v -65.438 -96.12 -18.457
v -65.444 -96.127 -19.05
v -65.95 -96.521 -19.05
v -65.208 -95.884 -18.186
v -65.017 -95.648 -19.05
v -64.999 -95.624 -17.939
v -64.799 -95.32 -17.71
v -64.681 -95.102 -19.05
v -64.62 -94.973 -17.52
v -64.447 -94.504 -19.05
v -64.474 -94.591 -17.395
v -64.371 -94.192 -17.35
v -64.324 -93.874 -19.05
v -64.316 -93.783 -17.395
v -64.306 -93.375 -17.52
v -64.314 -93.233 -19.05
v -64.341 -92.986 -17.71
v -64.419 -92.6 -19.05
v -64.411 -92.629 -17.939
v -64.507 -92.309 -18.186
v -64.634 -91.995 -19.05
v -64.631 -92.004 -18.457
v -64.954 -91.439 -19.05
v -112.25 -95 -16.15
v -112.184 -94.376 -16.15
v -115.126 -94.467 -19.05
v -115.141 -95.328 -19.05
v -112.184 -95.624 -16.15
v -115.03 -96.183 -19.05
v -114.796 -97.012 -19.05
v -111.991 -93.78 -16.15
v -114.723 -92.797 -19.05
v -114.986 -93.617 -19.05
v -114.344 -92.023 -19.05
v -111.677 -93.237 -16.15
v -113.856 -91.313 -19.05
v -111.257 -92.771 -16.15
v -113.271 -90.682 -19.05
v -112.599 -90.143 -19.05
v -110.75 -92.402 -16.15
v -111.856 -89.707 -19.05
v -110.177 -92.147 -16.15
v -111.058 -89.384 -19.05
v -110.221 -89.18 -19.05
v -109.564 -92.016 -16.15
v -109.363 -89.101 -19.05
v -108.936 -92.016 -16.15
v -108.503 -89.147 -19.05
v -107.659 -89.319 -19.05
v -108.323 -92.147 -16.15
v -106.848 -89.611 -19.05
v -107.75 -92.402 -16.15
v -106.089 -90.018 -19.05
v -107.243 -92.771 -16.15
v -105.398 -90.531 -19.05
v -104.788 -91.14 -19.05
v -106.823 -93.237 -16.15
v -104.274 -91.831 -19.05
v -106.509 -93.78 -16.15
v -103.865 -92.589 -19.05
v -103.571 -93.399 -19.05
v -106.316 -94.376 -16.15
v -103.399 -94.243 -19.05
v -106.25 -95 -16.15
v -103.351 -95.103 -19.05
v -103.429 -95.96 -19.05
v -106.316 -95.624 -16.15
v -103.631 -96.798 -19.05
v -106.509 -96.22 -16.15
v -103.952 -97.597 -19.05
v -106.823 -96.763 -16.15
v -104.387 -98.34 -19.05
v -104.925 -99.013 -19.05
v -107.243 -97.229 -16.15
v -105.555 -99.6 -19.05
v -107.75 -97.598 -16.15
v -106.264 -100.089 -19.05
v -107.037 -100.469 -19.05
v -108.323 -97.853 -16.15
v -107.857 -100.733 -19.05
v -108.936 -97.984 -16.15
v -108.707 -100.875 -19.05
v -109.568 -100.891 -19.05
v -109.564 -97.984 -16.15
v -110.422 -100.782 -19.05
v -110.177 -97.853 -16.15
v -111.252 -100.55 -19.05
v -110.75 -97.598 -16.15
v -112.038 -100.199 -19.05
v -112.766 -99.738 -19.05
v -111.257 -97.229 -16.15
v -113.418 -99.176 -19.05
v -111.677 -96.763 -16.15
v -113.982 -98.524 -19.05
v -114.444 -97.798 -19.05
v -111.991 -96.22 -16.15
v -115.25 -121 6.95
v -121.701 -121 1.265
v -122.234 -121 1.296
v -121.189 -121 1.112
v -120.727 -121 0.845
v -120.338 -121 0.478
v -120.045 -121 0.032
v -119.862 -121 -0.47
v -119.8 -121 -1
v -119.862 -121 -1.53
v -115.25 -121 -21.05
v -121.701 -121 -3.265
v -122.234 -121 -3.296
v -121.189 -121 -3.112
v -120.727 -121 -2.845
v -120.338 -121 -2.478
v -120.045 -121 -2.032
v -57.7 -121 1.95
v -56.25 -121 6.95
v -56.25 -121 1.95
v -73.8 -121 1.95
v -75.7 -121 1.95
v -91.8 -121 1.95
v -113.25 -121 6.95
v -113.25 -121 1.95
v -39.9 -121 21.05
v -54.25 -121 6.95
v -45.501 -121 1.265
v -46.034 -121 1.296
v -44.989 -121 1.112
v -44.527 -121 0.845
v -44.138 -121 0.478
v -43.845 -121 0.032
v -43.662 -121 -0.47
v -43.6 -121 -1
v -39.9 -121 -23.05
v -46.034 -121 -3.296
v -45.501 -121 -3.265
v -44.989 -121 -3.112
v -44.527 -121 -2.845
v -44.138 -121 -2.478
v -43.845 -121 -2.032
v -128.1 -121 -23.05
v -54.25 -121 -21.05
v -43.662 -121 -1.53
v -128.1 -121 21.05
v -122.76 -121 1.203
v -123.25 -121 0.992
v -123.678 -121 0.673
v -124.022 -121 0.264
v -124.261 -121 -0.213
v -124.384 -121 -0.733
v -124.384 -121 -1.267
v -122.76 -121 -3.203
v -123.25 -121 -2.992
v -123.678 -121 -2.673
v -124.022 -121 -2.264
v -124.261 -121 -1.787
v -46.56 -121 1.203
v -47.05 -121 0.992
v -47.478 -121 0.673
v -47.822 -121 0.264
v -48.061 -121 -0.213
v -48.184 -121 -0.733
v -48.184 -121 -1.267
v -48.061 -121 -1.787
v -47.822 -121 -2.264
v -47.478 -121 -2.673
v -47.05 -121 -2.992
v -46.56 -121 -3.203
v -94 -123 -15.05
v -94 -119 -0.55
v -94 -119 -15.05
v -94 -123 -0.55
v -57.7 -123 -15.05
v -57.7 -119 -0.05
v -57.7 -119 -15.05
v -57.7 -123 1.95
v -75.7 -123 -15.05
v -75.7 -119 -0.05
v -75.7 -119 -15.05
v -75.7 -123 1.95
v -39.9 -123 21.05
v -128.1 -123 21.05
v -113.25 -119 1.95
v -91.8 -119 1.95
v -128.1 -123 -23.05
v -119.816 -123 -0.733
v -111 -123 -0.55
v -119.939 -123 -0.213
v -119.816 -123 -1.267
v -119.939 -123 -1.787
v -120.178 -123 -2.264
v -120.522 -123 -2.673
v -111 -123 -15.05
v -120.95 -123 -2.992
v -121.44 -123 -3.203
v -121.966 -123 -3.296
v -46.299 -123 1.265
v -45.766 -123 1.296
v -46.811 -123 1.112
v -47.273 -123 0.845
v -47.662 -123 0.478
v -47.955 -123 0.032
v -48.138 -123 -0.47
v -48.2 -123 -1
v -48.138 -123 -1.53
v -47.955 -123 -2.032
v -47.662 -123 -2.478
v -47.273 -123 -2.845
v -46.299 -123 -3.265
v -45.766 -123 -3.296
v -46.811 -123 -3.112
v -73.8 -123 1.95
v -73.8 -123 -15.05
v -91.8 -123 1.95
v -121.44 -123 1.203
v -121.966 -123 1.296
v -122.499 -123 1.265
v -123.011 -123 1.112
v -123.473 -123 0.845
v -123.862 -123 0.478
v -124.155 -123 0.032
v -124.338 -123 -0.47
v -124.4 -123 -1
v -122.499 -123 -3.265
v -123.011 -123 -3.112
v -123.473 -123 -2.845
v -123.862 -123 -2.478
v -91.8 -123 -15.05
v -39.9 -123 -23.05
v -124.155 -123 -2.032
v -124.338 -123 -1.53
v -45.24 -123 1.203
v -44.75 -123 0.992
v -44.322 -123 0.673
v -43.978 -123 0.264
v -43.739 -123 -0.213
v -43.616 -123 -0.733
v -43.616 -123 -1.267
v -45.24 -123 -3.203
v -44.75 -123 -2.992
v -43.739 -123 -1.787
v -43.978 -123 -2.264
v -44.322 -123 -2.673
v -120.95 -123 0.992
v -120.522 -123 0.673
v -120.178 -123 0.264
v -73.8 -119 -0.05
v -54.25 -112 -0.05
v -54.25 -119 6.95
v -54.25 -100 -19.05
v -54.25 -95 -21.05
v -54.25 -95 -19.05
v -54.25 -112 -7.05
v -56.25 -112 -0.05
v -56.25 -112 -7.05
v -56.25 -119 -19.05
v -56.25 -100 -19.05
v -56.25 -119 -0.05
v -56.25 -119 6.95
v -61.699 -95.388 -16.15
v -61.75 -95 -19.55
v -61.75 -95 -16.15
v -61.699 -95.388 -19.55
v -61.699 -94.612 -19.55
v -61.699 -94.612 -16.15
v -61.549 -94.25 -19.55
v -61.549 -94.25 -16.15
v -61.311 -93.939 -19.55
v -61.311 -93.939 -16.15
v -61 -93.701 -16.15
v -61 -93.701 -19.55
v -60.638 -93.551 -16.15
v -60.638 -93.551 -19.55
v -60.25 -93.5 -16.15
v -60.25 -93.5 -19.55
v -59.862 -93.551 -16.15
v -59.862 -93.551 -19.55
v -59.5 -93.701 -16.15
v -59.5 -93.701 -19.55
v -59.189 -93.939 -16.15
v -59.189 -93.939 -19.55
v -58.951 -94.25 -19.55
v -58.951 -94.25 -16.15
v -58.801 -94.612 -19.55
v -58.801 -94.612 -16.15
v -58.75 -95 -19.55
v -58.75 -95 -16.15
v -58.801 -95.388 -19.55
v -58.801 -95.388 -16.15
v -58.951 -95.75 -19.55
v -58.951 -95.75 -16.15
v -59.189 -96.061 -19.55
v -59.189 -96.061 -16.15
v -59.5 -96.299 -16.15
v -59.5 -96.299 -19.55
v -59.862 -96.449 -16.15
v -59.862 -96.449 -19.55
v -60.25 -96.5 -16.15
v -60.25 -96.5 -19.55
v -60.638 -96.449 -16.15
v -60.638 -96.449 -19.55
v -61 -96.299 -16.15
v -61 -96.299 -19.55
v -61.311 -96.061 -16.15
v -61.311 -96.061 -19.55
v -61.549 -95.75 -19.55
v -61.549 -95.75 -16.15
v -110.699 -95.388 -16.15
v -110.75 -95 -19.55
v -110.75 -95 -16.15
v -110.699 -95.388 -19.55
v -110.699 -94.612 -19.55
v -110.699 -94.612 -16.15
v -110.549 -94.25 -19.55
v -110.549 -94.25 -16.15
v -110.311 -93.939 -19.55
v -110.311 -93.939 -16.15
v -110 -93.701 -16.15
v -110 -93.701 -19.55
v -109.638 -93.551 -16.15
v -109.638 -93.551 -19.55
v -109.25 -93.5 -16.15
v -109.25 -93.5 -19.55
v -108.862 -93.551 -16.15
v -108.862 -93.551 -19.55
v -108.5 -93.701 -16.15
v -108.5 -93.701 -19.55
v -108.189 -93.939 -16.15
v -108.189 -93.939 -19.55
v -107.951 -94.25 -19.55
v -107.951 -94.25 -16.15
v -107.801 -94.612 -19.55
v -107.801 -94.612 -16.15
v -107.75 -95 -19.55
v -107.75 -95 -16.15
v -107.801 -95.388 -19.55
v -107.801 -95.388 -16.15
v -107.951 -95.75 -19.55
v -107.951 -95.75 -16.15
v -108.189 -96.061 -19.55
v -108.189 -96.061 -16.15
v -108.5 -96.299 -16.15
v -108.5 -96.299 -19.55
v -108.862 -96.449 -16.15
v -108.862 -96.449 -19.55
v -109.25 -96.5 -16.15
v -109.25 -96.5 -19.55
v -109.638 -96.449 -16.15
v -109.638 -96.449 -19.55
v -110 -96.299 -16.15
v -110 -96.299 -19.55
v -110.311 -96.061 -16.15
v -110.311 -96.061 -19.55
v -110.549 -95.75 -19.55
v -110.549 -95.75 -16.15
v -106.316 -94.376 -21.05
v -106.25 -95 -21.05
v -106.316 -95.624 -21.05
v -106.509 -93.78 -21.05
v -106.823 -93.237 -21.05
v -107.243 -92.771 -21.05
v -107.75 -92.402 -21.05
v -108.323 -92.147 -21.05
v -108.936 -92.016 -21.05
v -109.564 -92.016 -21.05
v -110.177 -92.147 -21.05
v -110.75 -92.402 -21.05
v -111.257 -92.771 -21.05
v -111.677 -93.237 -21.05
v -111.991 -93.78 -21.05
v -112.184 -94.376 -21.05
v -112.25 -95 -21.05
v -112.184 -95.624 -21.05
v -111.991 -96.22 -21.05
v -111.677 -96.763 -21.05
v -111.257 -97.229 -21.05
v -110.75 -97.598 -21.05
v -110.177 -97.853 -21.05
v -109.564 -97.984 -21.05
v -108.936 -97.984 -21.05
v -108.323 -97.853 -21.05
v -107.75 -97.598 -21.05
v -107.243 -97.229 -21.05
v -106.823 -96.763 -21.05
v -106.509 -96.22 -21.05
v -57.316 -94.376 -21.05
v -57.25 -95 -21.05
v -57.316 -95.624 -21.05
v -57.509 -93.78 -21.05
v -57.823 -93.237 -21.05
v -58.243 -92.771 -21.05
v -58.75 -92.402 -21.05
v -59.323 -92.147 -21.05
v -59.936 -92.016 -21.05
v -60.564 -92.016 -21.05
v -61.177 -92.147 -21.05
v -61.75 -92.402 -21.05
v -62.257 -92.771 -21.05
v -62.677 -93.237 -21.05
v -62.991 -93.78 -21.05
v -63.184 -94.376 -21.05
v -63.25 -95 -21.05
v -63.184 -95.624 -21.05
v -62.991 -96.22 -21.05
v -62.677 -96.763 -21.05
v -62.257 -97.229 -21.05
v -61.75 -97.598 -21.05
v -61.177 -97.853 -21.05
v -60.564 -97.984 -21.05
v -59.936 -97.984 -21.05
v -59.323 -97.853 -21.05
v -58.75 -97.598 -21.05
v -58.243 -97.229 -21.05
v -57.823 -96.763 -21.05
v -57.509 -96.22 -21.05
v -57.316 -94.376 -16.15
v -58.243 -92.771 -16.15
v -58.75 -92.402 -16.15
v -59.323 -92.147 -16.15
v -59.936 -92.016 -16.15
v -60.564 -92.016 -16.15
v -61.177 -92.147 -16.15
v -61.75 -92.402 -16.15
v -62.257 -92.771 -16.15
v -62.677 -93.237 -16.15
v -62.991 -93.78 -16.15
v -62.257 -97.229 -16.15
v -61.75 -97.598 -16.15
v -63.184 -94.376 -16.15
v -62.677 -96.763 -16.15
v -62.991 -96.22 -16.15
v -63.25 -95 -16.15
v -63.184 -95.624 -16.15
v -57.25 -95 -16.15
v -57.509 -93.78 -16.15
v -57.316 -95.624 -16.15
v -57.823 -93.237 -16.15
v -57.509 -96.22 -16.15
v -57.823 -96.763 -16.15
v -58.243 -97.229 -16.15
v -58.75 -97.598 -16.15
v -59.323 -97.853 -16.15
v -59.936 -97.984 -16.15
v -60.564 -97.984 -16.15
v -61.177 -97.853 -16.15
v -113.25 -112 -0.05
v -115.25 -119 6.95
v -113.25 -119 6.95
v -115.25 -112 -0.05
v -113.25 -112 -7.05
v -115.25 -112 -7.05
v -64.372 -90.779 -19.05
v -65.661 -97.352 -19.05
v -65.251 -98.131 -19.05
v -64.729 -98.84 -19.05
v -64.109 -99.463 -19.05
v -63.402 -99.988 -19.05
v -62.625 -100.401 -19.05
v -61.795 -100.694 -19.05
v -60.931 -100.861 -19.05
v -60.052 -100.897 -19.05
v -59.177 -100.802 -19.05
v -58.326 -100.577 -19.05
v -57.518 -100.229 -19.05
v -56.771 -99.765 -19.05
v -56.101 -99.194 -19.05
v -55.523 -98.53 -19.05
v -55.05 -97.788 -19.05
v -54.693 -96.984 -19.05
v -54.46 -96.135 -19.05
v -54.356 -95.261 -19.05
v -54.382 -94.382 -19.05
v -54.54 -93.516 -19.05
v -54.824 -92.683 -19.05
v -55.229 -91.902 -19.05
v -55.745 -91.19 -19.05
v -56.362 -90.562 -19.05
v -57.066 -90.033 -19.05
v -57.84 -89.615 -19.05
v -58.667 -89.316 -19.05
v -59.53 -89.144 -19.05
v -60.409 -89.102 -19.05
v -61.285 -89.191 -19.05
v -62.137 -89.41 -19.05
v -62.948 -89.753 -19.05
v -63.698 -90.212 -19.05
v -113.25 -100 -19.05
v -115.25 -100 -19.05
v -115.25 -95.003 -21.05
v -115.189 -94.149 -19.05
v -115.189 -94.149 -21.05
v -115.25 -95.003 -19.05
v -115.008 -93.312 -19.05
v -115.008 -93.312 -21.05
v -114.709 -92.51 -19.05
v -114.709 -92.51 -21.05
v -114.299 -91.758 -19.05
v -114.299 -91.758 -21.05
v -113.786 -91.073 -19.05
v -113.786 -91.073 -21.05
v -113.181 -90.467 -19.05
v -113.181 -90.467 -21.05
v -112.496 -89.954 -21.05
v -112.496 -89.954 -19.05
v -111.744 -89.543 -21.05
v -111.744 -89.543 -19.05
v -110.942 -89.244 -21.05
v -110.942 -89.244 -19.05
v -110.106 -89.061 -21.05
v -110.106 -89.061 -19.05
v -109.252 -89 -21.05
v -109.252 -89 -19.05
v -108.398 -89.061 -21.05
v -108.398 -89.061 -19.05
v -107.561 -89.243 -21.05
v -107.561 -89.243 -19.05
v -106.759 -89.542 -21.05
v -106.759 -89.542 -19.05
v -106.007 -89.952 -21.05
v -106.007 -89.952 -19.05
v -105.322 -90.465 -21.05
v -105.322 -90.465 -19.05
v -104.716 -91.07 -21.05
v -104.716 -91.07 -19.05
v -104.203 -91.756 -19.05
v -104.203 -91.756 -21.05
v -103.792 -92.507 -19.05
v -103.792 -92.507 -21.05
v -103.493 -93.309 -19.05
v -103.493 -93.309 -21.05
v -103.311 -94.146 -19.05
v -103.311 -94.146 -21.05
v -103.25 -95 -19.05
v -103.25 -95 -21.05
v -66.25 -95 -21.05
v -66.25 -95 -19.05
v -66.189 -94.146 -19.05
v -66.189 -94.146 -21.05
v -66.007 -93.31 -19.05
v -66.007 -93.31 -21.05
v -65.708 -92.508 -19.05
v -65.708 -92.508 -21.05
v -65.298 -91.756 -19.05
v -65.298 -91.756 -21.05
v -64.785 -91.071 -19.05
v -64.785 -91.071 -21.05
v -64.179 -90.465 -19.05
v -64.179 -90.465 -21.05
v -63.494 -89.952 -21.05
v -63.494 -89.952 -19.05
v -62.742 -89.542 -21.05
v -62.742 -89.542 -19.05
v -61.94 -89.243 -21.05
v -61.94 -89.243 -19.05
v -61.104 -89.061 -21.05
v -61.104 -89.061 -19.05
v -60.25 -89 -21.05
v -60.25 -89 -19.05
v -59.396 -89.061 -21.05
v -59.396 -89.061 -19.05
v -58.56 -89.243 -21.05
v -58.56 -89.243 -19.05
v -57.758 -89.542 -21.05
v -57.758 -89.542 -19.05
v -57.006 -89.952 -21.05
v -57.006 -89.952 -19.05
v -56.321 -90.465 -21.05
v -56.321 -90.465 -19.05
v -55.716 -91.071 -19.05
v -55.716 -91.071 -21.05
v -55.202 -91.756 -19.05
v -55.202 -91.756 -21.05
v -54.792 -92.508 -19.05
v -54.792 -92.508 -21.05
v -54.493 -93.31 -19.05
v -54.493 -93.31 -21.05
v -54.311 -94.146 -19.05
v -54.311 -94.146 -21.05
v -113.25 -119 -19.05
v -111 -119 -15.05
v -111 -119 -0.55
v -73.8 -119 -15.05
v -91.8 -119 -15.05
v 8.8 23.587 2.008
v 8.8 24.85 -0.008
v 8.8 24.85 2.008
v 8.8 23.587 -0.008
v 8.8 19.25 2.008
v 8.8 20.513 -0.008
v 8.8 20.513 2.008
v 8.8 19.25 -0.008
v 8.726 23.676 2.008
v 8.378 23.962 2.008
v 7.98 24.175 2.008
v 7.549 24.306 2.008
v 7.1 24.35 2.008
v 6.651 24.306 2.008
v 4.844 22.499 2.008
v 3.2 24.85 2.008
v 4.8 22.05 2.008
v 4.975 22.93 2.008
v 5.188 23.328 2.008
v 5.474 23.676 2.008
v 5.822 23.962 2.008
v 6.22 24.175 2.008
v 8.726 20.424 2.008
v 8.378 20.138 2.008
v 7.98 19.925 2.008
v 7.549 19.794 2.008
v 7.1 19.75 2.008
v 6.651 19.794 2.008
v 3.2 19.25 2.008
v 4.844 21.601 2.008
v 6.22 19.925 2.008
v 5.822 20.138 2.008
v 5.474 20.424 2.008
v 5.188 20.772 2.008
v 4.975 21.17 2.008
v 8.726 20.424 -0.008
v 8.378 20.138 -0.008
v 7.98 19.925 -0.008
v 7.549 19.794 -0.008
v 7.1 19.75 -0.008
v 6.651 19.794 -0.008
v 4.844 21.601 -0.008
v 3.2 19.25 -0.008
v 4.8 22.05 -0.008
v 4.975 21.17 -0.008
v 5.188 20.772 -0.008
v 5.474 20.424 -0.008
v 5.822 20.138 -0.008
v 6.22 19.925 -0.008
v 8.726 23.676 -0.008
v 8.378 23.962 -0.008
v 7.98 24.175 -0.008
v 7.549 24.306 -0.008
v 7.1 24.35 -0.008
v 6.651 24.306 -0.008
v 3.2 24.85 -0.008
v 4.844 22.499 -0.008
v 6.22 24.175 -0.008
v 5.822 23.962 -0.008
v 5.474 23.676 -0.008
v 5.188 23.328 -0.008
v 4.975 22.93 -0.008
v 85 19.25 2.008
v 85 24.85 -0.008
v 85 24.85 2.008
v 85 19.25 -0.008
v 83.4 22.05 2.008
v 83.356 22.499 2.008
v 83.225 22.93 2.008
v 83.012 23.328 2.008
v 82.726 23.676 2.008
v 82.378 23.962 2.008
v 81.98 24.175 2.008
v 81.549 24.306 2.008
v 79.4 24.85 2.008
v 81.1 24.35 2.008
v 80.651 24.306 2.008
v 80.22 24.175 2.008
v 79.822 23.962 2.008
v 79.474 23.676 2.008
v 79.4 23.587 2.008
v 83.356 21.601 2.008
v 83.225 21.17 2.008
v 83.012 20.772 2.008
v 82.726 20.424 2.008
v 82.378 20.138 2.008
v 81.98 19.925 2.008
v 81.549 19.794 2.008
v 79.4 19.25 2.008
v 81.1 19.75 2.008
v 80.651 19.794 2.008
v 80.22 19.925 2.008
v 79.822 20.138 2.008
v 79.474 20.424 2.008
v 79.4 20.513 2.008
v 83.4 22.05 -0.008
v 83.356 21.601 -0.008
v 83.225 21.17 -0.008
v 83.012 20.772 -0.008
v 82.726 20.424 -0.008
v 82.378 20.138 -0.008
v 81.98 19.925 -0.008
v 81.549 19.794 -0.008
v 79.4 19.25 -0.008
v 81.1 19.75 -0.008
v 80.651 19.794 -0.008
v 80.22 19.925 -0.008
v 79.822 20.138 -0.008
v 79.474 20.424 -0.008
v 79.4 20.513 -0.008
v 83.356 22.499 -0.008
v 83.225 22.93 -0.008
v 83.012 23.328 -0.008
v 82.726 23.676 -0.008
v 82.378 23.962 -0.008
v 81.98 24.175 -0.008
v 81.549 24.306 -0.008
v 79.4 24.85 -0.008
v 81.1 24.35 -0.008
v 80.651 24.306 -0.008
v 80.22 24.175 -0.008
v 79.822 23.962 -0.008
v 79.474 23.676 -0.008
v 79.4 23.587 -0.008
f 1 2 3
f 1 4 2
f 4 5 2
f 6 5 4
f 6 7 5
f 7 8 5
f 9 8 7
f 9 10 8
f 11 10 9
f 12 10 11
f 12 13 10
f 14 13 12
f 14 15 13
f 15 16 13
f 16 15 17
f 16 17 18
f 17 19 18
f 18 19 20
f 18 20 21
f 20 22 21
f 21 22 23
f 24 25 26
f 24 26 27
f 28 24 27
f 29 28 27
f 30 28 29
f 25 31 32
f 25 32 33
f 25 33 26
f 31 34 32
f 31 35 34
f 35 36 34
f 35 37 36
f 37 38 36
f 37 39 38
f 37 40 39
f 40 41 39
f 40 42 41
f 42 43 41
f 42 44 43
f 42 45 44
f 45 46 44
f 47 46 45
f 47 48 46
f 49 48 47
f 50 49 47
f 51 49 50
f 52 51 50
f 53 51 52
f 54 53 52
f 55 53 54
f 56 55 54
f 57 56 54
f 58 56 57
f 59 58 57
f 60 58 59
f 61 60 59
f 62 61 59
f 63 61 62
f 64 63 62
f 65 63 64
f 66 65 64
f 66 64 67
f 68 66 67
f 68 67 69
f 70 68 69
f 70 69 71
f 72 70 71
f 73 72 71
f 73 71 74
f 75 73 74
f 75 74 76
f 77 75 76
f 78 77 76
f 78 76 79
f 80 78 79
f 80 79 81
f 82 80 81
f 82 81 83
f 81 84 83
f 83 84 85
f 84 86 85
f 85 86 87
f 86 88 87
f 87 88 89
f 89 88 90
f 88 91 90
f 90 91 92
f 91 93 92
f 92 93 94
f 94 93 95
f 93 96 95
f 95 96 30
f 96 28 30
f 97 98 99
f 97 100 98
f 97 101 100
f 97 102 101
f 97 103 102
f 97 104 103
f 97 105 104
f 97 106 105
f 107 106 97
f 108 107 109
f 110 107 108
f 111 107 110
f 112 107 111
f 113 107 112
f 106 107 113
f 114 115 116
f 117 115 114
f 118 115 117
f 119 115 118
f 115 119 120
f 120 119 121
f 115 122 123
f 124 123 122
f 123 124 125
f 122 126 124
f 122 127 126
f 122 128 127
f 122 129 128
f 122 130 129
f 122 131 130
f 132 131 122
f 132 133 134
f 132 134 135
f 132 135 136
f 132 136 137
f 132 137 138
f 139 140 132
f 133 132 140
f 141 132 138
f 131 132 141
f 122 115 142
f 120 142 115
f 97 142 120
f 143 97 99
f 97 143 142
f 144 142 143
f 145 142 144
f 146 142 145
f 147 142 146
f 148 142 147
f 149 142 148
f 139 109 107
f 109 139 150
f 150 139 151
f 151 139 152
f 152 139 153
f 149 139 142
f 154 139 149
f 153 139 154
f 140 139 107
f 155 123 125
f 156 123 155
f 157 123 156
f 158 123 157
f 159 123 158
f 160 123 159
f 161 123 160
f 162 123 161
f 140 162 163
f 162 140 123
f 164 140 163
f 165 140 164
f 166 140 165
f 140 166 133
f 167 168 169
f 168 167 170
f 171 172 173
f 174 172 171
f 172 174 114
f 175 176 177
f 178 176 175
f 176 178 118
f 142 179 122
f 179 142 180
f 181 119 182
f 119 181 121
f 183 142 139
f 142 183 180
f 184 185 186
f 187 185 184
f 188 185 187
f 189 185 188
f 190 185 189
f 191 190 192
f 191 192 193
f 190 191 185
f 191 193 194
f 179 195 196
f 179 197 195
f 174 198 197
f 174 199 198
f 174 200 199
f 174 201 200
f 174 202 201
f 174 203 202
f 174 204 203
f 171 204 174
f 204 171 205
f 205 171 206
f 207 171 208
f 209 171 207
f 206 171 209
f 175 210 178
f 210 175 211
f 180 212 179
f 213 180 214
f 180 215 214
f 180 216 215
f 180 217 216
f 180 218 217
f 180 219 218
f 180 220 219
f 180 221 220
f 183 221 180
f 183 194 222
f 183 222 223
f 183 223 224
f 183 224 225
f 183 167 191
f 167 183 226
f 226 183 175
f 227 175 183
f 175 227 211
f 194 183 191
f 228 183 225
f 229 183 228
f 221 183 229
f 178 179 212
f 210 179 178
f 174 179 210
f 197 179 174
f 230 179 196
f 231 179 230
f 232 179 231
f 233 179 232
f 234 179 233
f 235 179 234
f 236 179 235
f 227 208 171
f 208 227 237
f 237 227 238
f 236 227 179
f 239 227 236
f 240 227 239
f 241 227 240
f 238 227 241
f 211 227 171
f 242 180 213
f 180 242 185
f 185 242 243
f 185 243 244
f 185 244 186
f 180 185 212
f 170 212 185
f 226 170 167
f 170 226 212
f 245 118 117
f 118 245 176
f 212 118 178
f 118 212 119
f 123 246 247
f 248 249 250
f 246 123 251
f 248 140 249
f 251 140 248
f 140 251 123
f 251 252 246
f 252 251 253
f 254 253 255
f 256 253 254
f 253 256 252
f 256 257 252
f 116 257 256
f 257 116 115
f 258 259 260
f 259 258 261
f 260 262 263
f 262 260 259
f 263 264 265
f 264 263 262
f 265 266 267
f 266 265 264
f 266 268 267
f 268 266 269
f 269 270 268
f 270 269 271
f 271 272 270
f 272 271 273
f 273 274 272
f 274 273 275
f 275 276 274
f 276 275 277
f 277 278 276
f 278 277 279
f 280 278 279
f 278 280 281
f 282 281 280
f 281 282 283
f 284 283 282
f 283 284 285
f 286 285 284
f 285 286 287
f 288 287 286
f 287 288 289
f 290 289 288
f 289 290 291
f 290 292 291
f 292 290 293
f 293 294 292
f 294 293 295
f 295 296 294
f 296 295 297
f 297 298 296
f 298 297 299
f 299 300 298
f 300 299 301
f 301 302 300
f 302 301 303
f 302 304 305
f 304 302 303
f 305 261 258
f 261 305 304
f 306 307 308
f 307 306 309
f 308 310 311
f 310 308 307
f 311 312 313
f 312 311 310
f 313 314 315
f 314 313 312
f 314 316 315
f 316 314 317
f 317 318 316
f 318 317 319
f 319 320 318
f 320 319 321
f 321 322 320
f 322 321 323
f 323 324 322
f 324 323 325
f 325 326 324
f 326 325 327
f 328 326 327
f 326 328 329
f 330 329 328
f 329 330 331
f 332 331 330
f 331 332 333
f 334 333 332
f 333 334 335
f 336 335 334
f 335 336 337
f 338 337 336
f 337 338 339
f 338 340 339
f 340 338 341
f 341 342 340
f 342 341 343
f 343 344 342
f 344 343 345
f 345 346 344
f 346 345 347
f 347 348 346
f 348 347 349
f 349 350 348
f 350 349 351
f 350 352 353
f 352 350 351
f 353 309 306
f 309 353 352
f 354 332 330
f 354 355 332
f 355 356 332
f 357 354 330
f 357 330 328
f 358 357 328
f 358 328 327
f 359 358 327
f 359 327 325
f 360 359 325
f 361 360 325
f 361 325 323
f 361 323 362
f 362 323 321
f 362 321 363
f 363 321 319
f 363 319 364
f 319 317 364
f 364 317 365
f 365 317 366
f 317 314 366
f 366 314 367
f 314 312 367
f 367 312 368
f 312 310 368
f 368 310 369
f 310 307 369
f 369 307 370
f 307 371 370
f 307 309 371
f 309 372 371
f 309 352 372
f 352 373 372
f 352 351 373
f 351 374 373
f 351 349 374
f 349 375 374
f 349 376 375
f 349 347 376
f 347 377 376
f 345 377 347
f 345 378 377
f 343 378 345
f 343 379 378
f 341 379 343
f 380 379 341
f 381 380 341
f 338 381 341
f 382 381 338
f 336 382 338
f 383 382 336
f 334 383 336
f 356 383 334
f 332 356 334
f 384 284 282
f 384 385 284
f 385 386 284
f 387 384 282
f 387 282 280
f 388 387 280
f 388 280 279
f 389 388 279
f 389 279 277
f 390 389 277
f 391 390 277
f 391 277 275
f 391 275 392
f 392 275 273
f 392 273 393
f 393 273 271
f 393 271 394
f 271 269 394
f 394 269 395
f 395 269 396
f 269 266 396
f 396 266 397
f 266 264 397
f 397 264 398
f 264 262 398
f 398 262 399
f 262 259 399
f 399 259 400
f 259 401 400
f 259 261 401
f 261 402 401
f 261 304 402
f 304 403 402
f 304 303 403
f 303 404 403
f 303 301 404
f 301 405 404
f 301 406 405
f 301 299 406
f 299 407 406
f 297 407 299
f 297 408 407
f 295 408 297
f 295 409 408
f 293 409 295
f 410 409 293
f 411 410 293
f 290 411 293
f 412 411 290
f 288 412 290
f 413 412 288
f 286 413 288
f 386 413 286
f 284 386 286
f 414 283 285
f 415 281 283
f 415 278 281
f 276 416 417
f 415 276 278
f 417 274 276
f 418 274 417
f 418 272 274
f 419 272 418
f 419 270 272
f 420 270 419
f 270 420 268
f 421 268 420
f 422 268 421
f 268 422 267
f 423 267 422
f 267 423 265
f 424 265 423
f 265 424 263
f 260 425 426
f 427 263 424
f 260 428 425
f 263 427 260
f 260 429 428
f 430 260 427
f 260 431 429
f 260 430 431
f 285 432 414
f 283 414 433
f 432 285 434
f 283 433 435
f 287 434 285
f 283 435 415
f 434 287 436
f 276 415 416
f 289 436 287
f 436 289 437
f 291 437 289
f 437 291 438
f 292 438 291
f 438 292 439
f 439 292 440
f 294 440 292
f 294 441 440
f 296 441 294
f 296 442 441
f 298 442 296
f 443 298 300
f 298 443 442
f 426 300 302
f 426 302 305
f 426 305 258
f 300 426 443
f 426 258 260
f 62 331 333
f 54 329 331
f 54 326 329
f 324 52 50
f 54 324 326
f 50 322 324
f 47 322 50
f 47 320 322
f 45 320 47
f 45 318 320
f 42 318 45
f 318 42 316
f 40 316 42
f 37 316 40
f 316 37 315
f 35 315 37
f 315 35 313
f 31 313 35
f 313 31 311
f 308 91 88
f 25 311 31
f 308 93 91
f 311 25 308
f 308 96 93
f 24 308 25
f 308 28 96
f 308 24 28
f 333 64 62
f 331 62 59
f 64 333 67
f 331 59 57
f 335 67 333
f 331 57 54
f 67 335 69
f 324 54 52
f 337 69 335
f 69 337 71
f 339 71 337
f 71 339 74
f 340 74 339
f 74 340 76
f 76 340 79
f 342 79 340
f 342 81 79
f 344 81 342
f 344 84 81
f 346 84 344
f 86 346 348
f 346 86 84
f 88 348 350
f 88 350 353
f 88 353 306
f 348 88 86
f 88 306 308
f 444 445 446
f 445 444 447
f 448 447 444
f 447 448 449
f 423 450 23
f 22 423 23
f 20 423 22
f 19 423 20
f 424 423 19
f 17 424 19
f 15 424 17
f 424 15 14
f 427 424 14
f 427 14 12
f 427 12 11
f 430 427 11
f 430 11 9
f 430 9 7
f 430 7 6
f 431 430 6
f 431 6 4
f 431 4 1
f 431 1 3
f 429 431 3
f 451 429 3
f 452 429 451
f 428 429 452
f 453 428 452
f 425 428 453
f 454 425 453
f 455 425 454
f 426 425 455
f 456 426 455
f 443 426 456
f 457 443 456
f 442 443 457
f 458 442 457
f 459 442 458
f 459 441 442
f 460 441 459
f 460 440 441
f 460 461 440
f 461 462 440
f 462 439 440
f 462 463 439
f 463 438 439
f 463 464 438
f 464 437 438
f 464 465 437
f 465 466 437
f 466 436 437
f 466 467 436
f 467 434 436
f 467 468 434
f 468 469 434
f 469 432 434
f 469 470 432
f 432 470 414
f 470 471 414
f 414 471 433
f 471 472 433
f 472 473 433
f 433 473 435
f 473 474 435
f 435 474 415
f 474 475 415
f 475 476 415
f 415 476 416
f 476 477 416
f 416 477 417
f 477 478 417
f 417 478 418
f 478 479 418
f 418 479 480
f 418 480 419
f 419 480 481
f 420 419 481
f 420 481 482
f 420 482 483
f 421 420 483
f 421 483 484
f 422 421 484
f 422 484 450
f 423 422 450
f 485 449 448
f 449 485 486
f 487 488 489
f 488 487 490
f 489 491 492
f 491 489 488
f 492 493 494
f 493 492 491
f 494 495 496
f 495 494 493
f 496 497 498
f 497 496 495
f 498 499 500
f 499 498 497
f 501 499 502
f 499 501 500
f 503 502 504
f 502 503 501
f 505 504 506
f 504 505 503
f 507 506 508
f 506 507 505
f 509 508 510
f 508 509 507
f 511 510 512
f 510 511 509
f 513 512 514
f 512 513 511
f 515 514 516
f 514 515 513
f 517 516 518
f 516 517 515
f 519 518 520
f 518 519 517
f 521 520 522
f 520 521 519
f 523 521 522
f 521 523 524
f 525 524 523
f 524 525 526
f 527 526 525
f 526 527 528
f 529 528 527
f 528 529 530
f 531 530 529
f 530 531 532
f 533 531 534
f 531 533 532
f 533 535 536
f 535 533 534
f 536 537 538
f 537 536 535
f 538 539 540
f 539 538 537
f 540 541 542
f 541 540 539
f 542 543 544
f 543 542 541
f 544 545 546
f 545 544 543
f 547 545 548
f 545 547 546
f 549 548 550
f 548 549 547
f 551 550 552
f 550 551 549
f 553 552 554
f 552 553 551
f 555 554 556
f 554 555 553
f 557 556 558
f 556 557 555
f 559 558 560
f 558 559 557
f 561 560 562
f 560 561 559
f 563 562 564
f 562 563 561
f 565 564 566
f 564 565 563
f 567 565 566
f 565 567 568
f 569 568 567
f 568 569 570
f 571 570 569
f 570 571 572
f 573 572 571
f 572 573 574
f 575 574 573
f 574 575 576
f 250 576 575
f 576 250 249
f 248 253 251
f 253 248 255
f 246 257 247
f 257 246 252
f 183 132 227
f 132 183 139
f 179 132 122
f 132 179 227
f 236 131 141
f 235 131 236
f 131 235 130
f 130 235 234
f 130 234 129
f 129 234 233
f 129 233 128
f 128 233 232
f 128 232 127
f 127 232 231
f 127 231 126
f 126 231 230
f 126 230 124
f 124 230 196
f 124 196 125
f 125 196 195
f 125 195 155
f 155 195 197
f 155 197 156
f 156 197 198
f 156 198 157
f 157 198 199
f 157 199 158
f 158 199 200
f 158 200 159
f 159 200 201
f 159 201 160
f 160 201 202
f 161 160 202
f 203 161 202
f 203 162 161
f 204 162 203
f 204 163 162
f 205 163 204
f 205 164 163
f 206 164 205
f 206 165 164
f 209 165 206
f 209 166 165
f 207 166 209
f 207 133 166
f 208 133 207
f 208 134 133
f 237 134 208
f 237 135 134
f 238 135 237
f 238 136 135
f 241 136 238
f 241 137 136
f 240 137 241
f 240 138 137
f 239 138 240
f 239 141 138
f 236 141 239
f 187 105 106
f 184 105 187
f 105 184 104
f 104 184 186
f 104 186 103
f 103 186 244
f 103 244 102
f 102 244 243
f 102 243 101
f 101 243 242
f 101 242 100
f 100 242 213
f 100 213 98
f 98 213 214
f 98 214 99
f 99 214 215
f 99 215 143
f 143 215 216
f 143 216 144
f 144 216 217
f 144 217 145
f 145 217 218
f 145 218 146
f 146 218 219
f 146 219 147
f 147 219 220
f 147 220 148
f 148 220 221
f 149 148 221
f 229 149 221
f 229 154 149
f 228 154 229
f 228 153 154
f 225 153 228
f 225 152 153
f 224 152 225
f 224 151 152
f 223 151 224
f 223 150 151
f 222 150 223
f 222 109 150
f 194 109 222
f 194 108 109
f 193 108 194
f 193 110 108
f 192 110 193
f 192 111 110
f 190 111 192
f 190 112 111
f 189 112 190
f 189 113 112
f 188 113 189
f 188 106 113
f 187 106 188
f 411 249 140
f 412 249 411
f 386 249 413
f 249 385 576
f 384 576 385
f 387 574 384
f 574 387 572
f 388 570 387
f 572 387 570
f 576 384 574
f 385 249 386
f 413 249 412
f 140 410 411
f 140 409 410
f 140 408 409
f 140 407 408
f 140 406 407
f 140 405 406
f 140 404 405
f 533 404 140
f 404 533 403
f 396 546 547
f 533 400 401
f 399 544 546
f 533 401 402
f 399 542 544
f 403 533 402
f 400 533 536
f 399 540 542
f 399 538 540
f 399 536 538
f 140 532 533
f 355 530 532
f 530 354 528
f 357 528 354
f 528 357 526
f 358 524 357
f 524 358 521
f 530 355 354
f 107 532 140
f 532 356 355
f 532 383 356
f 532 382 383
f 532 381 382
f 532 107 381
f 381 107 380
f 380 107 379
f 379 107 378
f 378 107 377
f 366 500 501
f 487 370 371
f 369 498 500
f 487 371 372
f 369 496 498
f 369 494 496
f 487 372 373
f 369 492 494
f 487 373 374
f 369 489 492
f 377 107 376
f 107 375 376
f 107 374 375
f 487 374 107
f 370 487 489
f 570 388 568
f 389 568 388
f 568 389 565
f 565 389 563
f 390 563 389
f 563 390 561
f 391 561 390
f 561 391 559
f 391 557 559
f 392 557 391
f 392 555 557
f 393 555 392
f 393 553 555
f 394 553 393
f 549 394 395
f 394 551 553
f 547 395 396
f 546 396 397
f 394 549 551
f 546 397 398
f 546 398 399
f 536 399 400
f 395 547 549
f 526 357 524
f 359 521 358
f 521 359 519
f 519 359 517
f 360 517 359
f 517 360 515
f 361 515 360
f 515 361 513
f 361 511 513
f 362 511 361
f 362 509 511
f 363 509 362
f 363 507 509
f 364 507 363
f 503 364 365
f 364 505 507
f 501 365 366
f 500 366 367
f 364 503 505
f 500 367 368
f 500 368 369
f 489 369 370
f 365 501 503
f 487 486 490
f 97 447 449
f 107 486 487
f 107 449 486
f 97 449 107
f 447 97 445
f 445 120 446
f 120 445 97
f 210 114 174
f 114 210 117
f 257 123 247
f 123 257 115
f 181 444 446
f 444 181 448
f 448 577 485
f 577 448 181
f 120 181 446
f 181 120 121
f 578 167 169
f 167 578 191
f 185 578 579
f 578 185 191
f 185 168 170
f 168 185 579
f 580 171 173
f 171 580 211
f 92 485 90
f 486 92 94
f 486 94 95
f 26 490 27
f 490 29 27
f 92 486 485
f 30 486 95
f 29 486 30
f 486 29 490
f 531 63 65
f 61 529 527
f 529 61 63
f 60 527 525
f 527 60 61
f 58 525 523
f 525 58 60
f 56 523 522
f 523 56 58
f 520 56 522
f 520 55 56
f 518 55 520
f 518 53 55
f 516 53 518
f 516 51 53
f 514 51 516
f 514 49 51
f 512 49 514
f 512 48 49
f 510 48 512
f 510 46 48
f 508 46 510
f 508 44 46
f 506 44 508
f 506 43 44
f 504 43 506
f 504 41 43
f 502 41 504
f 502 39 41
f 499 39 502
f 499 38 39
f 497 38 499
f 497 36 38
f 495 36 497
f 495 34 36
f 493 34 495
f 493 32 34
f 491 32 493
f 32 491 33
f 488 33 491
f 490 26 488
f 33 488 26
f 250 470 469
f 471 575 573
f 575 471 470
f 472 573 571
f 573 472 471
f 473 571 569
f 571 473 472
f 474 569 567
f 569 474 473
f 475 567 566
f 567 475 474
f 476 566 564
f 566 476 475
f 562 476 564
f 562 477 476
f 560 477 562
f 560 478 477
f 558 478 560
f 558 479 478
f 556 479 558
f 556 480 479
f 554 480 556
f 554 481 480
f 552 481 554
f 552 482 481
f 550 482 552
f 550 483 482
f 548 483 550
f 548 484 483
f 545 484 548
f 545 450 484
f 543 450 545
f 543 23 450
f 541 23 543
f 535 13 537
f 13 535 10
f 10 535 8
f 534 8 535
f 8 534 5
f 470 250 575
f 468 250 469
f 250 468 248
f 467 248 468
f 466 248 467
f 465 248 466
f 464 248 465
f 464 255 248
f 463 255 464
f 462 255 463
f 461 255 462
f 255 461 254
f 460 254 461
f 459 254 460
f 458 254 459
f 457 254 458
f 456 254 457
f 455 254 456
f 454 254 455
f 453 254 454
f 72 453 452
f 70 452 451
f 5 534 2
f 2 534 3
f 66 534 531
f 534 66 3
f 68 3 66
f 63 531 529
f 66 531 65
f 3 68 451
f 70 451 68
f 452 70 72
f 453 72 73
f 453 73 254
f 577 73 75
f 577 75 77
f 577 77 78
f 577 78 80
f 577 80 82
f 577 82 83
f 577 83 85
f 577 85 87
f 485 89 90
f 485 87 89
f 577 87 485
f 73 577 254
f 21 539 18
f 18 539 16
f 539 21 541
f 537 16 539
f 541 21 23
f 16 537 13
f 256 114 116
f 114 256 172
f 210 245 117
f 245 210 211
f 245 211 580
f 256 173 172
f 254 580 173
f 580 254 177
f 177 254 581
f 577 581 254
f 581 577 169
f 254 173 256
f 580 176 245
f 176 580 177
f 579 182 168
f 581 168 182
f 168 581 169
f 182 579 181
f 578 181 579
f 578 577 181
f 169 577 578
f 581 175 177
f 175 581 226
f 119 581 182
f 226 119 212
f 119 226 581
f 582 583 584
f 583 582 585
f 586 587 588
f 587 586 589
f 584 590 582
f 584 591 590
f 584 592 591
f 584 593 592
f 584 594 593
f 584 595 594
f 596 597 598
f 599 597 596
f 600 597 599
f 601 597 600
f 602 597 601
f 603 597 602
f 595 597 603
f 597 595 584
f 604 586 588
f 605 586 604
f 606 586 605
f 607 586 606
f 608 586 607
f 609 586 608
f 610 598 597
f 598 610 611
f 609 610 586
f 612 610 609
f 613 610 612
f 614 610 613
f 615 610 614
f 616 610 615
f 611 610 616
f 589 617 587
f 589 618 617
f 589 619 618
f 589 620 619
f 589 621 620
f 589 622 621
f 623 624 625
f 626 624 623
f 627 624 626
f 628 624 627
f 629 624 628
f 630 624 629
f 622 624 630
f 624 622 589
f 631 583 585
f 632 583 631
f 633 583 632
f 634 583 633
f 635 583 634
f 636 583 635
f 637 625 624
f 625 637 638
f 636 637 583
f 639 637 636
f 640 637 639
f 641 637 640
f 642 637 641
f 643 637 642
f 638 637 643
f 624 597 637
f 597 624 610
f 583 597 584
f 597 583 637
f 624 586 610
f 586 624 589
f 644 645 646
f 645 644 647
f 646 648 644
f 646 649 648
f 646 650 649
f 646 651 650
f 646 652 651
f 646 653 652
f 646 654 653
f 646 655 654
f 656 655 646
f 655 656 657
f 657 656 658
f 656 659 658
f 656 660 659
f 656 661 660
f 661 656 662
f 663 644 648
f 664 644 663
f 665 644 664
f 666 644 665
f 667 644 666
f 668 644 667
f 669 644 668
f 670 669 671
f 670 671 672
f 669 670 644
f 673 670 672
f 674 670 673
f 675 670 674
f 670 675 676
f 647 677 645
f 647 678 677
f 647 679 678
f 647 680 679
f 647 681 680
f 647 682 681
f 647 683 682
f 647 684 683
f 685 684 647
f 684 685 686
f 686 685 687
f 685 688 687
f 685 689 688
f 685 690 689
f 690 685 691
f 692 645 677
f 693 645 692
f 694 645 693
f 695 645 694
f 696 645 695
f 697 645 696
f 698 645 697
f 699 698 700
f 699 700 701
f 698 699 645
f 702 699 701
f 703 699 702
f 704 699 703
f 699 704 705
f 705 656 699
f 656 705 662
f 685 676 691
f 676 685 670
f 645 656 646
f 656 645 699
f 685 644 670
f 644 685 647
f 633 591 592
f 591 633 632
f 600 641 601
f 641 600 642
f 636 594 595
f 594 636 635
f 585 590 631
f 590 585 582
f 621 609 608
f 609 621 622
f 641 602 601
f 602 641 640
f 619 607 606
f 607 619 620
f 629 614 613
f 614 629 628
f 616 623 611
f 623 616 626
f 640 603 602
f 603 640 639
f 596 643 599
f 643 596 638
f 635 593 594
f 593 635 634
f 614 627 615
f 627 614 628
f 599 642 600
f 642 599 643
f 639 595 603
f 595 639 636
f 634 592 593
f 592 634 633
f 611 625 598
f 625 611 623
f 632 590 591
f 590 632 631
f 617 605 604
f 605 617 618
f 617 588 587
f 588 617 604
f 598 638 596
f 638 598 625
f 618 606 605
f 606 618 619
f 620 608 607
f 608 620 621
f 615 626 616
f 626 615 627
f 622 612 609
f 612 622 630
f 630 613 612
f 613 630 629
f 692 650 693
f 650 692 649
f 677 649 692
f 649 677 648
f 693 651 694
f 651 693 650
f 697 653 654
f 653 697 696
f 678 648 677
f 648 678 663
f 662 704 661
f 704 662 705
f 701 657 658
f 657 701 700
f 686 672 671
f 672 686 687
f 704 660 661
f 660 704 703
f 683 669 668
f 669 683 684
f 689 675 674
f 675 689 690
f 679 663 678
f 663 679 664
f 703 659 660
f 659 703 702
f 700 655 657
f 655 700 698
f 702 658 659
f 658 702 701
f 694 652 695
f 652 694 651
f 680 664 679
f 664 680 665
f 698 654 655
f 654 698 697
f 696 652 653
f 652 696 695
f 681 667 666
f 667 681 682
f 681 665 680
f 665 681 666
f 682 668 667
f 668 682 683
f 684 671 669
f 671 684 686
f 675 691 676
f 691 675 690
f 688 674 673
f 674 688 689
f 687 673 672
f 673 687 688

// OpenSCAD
show_assembly = true;

e = 1/128;

rack_model_stl = "Pi 5 Rack.3mf";

hole_distance = 74.0;
interior_gap = 62.0;
total_span = 88.0;

/* [Hidden] */

rack_h = 88.2;
rack_w = 22.050 * 2;
rack_hole_inset = 6.0;
rack_hole_radius = 2.300;

rack_face_thickness = 2.0;

fudge = 0.2;

// rpi 3b
rpi_width = 56.5;
rpi_depth = 85.6;
rpi_height = 27.0; // allow for some height on dupont connectors in GPIO header

module single_look() {
  intersection() {
    modified_import();
  }
}


module modified_import () {

  patch_hole_diameter = 2 * (rack_hole_radius + 0.5);

  old_hole1_y = (1/2)*(rack_w - patch_hole_diameter);
  old_hole1_x = rack_hole_inset - (1/2)*patch_hole_diameter;

  old_hole2_y = old_hole1_y;
  old_hole2_x = rack_h - rack_hole_inset - (1/2)*patch_hole_diameter;

  patch_size = [patch_hole_diameter, patch_hole_diameter,
                rack_face_thickness + 2*e];

  hole1_y =  (1/2)*(rack_w);
  hole1_x =  (1/2)*(rack_h - hole_distance);

  hole2_y =  (1/2)*(rack_w);
  hole2_x =  rack_h - (1/2)*(rack_h - hole_distance);


  difference () {
    union() {
      translate(v = [-84, -106, -1])
        rotate([0,0,0])
        import(rack_model_stl);

      // fill in exisiting holes
      translate([old_hole1_x, old_hole1_y, -e])
        cube(patch_size);

      // fill in exisiting holes
      translate([old_hole2_x, old_hole2_y, -e])
        cube(patch_size);
    }

    $fn = 32;
    translate([hole1_x, hole1_y, -2*e])
    cylinder(h = rack_face_thickness + 4*e, r = rack_hole_radius, center = false);

    translate([hole2_x, hole2_y, -2*e])
    cylinder(h = rack_face_thickness + 4*e, r = rack_hole_radius, center = false);

  }
}




module rpi () {
  difference() {
    color("green")
    cube ([rpi_width, rpi_depth, rpi_height]);
  }
}



module assembly() {


  // intersection() {
    modified_import();


}

if (show_assembly) {
  assembly();
} else {
  single_look();


}
